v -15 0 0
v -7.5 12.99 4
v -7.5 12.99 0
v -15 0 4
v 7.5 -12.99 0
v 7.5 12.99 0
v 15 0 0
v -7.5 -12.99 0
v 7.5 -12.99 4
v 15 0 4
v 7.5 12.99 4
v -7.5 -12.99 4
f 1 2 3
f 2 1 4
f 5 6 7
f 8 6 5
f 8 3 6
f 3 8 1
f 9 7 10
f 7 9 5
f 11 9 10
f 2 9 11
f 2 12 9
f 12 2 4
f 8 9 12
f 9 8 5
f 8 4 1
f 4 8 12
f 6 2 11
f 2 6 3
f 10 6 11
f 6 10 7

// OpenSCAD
// resolution bezier curve
deltat = 0.02;

// cubic bexier curve function
function cubic_bezier(p0,p1,p2,p3) = [for (t=[0:deltat:1+deltat]) pow(1-t,3)*p0+3*pow((1-t),2)*t*p1+3*(1-t)*pow(t,2)*p2+pow(t,3)*p3];
    
function reverse(v) = [for (i=[len(v)-1:-1:0]) v[i]];
function delete_first(v) = [for (i=[1:len(v)-1]) v[i]]; 


p10 = [-4.75,4.001];
p11 = [-2.75,4.0];
p12 = [-4.8,2.2];
p13 = [0.0,2.0];

p20 = [4.75,4.001];
p21 = [2.75,4.0];
p22 = [4.8,2.2];
p23 = [0.0,2.0];



// bezier curve for cx
points_left = cubic_bezier(p10, p11, p12, p13);
points_right = reverse(cubic_bezier(p20, p21, p22, p23));
points = concat(points_left, points_right);


difference()
{
    color("Peru", 1.0)
    {
        // hexagon base
        linear_extrude(height = 4, center = false, convexity = 10, twist = 0)
        circle(r=15, $fn=6);
    }
    
    color("Blue", 1.0)
    {
        // canal shape
        rotate([90,0,0])
        linear_extrude(height=30, center=true, convexity = 10, twist = 0)
        polygon(points);
    }
    
    color("Blue", 1.0)
    {
        // canal shape
        translate([22.5,-12.99,0])
        rotate_extrude(angle=360, convexity=10, $fn=90)
        translate([-22.5,0,0])
        polygon(points);
    }
    
}
